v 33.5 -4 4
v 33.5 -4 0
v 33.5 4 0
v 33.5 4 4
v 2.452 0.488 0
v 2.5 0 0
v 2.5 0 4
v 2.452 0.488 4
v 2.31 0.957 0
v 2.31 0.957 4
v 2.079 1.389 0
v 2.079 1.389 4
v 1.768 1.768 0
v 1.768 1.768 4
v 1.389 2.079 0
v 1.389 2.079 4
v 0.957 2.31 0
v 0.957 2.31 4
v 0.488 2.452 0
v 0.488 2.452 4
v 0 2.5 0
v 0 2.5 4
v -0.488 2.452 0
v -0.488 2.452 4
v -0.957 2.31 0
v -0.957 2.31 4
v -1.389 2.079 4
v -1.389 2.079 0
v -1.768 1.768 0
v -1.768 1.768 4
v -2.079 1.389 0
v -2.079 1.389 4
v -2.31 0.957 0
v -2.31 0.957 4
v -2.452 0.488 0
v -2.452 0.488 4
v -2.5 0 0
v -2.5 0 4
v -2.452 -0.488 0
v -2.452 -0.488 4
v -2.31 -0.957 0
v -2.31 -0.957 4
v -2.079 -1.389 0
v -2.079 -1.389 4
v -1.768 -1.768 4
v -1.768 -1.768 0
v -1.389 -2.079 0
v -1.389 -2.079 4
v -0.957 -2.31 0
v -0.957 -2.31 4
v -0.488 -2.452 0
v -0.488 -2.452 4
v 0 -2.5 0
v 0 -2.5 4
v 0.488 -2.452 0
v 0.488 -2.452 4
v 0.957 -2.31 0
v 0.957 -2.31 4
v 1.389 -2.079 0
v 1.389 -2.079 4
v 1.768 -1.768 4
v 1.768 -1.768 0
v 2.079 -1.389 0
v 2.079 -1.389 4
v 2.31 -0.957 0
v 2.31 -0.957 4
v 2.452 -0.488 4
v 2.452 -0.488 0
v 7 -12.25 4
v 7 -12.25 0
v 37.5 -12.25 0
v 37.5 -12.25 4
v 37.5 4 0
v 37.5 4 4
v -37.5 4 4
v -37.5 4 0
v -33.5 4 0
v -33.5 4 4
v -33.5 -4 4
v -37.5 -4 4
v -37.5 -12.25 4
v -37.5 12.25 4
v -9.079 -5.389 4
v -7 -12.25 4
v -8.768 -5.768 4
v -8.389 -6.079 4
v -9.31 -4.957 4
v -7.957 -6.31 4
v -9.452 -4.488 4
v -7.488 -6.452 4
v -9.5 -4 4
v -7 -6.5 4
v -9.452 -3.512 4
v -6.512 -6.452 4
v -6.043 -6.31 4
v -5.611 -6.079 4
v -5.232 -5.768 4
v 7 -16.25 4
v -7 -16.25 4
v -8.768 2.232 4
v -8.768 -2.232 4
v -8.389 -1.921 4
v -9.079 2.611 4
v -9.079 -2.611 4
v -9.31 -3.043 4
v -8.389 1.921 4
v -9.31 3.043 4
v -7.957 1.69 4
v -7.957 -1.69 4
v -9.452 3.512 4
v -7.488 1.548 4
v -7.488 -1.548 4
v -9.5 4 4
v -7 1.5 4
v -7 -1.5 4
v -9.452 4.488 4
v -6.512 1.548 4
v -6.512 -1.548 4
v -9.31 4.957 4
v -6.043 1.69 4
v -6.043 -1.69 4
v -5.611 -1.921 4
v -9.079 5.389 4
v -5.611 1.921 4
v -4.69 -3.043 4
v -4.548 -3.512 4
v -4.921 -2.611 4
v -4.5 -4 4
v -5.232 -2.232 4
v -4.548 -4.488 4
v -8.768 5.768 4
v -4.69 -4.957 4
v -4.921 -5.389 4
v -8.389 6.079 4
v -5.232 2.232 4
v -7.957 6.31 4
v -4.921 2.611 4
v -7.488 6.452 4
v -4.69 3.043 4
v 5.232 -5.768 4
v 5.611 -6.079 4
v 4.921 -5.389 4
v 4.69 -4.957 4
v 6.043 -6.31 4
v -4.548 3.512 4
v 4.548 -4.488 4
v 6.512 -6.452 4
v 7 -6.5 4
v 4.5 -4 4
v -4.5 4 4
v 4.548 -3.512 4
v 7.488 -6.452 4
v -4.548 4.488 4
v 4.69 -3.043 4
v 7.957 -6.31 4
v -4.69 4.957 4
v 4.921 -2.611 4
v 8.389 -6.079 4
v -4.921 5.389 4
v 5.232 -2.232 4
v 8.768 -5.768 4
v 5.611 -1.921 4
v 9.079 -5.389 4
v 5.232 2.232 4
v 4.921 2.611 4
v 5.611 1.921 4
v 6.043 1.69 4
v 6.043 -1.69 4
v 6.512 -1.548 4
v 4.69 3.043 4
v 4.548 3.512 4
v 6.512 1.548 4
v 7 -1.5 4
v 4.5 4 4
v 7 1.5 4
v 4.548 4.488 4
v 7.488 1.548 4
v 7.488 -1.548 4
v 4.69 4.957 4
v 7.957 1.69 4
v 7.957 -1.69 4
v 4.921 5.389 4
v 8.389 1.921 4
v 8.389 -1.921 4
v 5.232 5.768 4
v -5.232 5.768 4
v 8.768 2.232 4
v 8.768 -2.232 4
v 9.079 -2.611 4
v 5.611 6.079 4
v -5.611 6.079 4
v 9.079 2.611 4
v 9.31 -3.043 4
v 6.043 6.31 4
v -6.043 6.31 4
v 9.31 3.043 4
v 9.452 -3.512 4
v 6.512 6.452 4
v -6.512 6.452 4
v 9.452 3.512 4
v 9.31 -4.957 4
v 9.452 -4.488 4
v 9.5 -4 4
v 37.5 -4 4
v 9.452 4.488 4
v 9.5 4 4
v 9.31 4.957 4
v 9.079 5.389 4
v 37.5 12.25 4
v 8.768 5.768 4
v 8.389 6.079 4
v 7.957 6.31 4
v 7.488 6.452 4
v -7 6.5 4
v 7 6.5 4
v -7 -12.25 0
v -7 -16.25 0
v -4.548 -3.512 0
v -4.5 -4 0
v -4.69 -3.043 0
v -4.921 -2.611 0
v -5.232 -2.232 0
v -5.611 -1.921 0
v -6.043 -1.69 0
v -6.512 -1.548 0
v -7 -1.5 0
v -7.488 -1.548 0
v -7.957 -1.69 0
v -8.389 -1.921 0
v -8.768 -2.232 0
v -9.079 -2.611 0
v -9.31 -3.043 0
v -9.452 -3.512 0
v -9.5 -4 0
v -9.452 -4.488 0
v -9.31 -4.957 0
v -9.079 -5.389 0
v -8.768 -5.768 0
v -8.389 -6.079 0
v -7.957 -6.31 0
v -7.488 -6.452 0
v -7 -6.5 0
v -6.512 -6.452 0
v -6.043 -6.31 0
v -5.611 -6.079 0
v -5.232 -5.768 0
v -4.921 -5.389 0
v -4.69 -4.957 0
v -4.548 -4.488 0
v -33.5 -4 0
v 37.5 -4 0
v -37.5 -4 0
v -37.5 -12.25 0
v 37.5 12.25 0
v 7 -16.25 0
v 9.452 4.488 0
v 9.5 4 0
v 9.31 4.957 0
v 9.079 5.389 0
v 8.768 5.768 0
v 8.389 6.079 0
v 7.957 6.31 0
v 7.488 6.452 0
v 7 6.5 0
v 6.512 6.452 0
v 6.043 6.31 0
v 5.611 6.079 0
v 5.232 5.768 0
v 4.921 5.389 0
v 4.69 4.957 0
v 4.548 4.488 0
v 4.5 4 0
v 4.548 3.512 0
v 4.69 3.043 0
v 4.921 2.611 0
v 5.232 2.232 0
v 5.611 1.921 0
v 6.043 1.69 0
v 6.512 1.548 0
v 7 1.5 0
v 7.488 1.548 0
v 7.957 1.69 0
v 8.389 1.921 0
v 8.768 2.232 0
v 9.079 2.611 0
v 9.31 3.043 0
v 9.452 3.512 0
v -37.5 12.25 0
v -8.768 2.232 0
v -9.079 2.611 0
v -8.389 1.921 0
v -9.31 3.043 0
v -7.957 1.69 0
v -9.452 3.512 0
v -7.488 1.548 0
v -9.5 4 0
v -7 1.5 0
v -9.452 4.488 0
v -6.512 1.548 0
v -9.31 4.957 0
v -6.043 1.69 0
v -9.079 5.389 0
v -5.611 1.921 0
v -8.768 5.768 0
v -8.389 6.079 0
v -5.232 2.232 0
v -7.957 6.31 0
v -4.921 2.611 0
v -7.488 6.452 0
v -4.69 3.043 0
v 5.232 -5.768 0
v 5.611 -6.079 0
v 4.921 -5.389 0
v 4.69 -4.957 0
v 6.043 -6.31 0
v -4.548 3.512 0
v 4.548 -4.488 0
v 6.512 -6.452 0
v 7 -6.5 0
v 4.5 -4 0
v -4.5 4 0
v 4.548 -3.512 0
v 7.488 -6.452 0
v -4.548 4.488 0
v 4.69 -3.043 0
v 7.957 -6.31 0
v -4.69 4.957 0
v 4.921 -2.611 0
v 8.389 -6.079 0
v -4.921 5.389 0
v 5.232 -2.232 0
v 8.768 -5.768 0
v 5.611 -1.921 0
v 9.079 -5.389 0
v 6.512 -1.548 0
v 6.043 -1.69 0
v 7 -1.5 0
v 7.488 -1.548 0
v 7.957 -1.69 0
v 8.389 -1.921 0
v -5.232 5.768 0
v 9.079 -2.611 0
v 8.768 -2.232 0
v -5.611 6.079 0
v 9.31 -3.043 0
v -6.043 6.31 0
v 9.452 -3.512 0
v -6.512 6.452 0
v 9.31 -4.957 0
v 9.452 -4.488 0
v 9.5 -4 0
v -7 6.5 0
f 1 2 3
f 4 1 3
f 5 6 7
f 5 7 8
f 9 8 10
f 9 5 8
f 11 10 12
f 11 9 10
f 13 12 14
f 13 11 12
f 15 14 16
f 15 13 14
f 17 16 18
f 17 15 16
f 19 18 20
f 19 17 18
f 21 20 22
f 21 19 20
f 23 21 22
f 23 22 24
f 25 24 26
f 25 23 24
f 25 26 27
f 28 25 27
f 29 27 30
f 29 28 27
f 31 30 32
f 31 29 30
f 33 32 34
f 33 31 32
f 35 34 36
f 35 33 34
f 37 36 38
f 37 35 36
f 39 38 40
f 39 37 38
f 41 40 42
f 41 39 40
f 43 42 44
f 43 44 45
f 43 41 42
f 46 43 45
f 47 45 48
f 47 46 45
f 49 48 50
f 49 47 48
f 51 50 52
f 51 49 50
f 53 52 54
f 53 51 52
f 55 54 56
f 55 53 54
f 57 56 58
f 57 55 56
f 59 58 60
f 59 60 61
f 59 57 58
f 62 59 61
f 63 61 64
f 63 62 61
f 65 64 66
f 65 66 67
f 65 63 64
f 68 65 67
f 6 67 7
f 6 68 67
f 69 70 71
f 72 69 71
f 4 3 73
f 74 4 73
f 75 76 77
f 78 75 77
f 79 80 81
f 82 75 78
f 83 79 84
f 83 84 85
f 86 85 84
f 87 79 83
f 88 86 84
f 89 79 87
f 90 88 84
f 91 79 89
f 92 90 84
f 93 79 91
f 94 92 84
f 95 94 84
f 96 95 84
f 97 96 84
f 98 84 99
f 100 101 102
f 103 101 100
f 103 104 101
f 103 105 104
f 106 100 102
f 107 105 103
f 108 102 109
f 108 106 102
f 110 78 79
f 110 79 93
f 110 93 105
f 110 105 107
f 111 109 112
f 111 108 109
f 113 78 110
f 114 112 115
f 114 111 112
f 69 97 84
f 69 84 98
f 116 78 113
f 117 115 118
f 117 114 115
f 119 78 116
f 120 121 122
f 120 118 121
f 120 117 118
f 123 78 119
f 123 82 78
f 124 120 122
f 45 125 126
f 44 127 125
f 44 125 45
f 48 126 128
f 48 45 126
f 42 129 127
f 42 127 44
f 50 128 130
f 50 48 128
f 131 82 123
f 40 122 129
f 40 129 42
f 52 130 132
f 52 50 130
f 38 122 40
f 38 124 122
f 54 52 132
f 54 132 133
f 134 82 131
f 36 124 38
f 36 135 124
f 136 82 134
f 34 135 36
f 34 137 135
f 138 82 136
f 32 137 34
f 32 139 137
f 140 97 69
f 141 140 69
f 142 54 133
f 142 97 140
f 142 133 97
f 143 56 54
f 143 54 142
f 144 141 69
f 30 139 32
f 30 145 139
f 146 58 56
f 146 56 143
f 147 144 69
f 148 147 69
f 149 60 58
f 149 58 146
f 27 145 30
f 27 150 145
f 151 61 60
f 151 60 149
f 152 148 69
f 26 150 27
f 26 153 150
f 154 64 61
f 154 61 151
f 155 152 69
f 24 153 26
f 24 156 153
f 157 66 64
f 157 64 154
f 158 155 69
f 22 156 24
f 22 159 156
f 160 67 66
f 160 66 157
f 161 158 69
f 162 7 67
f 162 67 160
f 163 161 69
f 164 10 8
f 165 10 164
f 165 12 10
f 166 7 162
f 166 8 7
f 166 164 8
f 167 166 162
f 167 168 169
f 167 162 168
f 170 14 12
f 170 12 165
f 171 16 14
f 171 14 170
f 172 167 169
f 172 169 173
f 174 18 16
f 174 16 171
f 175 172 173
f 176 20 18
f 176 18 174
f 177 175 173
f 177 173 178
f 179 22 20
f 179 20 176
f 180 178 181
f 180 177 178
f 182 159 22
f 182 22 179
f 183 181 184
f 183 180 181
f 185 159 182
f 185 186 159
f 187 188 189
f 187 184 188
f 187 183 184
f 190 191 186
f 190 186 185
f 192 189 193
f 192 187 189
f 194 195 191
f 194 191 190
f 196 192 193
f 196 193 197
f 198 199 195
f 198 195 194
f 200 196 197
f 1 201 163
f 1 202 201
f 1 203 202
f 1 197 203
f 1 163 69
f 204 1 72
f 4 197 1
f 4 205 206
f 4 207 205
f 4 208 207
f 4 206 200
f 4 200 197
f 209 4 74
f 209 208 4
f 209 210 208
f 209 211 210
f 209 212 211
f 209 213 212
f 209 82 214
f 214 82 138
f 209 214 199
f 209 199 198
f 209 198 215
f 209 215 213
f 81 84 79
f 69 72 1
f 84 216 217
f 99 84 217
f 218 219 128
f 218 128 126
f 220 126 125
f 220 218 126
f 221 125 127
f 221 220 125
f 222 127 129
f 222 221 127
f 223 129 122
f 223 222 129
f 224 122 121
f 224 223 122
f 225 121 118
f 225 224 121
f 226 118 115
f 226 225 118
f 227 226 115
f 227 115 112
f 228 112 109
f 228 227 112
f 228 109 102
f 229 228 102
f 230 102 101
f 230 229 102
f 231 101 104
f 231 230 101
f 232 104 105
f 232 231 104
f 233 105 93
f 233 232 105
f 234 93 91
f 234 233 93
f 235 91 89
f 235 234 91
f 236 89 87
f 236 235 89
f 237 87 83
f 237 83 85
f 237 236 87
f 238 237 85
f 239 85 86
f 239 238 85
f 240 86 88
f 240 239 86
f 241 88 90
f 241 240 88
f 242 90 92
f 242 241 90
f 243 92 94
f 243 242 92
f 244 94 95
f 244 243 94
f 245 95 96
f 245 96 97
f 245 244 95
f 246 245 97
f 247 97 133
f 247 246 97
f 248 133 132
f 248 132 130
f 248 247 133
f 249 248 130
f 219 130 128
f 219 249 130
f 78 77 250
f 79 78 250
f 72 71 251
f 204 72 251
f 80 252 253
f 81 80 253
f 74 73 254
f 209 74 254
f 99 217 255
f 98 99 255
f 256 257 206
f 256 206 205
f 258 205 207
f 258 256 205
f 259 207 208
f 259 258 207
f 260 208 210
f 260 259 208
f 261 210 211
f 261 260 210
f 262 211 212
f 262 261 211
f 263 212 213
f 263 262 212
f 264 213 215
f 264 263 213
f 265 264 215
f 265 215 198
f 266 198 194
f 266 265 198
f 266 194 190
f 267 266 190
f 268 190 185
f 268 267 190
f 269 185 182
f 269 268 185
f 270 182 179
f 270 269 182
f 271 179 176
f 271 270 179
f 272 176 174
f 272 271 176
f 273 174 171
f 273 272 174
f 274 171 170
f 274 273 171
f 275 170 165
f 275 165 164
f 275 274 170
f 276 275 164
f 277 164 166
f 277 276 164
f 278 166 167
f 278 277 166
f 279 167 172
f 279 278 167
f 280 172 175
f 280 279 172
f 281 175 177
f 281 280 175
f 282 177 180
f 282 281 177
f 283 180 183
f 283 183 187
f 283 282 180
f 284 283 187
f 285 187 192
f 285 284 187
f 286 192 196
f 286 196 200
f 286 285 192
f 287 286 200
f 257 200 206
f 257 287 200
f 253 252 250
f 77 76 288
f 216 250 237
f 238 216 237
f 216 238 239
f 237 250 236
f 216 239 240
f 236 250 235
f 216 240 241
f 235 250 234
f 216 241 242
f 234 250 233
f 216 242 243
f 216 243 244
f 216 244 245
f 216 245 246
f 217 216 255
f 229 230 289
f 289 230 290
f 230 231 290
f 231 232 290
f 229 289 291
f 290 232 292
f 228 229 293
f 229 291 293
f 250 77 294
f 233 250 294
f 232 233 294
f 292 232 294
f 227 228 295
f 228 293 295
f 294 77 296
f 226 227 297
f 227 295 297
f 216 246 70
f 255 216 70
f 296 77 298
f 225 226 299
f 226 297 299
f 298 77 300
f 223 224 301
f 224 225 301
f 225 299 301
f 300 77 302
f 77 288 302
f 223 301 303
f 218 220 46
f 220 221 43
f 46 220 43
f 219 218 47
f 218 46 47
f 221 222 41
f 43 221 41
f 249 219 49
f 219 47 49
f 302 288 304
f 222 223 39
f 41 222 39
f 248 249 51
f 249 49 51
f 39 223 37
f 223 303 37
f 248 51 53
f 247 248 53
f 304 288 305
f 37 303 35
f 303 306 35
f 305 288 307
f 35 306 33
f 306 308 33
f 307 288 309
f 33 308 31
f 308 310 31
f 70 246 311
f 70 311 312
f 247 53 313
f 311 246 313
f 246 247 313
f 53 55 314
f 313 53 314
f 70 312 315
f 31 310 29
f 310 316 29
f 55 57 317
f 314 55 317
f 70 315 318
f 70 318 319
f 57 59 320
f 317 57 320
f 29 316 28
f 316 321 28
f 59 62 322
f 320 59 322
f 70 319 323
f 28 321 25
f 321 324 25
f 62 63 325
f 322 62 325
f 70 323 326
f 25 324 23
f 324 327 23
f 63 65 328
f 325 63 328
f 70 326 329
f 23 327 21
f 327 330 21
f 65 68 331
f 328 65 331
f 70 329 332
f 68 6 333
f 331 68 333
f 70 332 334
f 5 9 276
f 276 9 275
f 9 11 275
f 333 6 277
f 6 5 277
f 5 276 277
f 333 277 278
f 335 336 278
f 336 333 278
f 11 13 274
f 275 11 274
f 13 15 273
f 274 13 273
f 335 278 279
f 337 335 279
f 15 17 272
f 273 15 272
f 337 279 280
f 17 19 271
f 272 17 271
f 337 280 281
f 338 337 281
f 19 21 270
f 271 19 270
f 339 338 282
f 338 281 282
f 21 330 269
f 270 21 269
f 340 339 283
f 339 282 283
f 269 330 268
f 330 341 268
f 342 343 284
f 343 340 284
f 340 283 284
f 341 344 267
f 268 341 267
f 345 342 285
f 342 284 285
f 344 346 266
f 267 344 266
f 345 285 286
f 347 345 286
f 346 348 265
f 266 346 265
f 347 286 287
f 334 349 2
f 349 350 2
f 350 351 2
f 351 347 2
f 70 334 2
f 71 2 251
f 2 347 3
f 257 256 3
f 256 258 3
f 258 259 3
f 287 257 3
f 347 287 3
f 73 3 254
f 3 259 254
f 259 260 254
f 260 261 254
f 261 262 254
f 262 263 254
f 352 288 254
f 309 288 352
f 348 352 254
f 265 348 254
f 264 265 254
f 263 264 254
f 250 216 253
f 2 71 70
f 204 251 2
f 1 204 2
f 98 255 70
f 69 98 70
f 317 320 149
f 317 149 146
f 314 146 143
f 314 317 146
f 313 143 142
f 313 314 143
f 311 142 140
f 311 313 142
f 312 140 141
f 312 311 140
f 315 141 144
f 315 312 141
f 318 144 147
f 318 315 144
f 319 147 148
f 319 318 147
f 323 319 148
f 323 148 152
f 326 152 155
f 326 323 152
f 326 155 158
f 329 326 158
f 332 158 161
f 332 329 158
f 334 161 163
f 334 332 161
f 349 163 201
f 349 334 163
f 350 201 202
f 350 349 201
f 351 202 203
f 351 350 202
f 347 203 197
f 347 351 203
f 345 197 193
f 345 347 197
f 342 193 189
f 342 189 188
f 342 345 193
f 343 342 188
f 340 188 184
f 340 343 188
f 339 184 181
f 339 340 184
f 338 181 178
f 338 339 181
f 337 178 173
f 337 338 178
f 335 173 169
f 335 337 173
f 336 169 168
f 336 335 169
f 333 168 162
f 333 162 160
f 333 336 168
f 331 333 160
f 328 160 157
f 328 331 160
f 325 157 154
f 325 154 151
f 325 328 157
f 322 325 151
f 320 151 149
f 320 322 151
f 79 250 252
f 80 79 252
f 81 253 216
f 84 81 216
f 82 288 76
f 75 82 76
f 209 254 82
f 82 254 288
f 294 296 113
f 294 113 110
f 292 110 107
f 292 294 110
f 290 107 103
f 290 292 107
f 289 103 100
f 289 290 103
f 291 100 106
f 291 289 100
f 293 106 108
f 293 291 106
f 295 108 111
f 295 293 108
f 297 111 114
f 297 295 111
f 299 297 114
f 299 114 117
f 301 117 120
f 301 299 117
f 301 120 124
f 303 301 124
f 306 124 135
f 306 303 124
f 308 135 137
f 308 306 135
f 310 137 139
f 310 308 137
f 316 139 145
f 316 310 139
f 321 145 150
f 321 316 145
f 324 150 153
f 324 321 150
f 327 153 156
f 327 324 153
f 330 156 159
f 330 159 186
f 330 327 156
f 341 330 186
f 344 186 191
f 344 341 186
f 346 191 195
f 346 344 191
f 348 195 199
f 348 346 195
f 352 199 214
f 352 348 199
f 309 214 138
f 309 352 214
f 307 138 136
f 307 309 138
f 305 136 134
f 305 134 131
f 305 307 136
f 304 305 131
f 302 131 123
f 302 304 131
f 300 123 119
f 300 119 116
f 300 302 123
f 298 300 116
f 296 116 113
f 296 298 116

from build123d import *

# Parameters (mm, degrees)
CROQUIS1_R              = 2.5
SALIENTE_EXTRUIR1_DEPTH = 4


with BuildPart() as part:
    # Croquis1 → Saliente-Extruir1 (new body)
    with BuildSketch(Plane.XY):
        Polygon((37.5, 12.25), (-37.5, 12.25), (-37.5, 4), (-33.5, 4), (-33.5, -4), (-37.5, -4), (-37.5, -12.25), (-7, -12.25), (-7, -16.25), (7, -16.25), (7, -12.25), (37.5, -12.25), (37.5, -4), (33.5, -4), (33.5, 4), (37.5, 4), align=None)
        Circle(CROQUIS1_R, mode=Mode.SUBTRACT)
        with Locations((7, 4)):
            Circle(CROQUIS1_R, mode=Mode.SUBTRACT)
        with Locations(Location((7, -4, 0), (0, 0, 180))):
            Circle(CROQUIS1_R, mode=Mode.SUBTRACT)
        with Locations((-7, -4)):
            Circle(CROQUIS1_R, mode=Mode.SUBTRACT)
        with Locations(Location((-7, 4, 0), (0, 0, 180))):
            Circle(CROQUIS1_R, mode=Mode.SUBTRACT)
    extrude(amount=SALIENTE_EXTRUIR1_DEPTH)


solid = part.part
